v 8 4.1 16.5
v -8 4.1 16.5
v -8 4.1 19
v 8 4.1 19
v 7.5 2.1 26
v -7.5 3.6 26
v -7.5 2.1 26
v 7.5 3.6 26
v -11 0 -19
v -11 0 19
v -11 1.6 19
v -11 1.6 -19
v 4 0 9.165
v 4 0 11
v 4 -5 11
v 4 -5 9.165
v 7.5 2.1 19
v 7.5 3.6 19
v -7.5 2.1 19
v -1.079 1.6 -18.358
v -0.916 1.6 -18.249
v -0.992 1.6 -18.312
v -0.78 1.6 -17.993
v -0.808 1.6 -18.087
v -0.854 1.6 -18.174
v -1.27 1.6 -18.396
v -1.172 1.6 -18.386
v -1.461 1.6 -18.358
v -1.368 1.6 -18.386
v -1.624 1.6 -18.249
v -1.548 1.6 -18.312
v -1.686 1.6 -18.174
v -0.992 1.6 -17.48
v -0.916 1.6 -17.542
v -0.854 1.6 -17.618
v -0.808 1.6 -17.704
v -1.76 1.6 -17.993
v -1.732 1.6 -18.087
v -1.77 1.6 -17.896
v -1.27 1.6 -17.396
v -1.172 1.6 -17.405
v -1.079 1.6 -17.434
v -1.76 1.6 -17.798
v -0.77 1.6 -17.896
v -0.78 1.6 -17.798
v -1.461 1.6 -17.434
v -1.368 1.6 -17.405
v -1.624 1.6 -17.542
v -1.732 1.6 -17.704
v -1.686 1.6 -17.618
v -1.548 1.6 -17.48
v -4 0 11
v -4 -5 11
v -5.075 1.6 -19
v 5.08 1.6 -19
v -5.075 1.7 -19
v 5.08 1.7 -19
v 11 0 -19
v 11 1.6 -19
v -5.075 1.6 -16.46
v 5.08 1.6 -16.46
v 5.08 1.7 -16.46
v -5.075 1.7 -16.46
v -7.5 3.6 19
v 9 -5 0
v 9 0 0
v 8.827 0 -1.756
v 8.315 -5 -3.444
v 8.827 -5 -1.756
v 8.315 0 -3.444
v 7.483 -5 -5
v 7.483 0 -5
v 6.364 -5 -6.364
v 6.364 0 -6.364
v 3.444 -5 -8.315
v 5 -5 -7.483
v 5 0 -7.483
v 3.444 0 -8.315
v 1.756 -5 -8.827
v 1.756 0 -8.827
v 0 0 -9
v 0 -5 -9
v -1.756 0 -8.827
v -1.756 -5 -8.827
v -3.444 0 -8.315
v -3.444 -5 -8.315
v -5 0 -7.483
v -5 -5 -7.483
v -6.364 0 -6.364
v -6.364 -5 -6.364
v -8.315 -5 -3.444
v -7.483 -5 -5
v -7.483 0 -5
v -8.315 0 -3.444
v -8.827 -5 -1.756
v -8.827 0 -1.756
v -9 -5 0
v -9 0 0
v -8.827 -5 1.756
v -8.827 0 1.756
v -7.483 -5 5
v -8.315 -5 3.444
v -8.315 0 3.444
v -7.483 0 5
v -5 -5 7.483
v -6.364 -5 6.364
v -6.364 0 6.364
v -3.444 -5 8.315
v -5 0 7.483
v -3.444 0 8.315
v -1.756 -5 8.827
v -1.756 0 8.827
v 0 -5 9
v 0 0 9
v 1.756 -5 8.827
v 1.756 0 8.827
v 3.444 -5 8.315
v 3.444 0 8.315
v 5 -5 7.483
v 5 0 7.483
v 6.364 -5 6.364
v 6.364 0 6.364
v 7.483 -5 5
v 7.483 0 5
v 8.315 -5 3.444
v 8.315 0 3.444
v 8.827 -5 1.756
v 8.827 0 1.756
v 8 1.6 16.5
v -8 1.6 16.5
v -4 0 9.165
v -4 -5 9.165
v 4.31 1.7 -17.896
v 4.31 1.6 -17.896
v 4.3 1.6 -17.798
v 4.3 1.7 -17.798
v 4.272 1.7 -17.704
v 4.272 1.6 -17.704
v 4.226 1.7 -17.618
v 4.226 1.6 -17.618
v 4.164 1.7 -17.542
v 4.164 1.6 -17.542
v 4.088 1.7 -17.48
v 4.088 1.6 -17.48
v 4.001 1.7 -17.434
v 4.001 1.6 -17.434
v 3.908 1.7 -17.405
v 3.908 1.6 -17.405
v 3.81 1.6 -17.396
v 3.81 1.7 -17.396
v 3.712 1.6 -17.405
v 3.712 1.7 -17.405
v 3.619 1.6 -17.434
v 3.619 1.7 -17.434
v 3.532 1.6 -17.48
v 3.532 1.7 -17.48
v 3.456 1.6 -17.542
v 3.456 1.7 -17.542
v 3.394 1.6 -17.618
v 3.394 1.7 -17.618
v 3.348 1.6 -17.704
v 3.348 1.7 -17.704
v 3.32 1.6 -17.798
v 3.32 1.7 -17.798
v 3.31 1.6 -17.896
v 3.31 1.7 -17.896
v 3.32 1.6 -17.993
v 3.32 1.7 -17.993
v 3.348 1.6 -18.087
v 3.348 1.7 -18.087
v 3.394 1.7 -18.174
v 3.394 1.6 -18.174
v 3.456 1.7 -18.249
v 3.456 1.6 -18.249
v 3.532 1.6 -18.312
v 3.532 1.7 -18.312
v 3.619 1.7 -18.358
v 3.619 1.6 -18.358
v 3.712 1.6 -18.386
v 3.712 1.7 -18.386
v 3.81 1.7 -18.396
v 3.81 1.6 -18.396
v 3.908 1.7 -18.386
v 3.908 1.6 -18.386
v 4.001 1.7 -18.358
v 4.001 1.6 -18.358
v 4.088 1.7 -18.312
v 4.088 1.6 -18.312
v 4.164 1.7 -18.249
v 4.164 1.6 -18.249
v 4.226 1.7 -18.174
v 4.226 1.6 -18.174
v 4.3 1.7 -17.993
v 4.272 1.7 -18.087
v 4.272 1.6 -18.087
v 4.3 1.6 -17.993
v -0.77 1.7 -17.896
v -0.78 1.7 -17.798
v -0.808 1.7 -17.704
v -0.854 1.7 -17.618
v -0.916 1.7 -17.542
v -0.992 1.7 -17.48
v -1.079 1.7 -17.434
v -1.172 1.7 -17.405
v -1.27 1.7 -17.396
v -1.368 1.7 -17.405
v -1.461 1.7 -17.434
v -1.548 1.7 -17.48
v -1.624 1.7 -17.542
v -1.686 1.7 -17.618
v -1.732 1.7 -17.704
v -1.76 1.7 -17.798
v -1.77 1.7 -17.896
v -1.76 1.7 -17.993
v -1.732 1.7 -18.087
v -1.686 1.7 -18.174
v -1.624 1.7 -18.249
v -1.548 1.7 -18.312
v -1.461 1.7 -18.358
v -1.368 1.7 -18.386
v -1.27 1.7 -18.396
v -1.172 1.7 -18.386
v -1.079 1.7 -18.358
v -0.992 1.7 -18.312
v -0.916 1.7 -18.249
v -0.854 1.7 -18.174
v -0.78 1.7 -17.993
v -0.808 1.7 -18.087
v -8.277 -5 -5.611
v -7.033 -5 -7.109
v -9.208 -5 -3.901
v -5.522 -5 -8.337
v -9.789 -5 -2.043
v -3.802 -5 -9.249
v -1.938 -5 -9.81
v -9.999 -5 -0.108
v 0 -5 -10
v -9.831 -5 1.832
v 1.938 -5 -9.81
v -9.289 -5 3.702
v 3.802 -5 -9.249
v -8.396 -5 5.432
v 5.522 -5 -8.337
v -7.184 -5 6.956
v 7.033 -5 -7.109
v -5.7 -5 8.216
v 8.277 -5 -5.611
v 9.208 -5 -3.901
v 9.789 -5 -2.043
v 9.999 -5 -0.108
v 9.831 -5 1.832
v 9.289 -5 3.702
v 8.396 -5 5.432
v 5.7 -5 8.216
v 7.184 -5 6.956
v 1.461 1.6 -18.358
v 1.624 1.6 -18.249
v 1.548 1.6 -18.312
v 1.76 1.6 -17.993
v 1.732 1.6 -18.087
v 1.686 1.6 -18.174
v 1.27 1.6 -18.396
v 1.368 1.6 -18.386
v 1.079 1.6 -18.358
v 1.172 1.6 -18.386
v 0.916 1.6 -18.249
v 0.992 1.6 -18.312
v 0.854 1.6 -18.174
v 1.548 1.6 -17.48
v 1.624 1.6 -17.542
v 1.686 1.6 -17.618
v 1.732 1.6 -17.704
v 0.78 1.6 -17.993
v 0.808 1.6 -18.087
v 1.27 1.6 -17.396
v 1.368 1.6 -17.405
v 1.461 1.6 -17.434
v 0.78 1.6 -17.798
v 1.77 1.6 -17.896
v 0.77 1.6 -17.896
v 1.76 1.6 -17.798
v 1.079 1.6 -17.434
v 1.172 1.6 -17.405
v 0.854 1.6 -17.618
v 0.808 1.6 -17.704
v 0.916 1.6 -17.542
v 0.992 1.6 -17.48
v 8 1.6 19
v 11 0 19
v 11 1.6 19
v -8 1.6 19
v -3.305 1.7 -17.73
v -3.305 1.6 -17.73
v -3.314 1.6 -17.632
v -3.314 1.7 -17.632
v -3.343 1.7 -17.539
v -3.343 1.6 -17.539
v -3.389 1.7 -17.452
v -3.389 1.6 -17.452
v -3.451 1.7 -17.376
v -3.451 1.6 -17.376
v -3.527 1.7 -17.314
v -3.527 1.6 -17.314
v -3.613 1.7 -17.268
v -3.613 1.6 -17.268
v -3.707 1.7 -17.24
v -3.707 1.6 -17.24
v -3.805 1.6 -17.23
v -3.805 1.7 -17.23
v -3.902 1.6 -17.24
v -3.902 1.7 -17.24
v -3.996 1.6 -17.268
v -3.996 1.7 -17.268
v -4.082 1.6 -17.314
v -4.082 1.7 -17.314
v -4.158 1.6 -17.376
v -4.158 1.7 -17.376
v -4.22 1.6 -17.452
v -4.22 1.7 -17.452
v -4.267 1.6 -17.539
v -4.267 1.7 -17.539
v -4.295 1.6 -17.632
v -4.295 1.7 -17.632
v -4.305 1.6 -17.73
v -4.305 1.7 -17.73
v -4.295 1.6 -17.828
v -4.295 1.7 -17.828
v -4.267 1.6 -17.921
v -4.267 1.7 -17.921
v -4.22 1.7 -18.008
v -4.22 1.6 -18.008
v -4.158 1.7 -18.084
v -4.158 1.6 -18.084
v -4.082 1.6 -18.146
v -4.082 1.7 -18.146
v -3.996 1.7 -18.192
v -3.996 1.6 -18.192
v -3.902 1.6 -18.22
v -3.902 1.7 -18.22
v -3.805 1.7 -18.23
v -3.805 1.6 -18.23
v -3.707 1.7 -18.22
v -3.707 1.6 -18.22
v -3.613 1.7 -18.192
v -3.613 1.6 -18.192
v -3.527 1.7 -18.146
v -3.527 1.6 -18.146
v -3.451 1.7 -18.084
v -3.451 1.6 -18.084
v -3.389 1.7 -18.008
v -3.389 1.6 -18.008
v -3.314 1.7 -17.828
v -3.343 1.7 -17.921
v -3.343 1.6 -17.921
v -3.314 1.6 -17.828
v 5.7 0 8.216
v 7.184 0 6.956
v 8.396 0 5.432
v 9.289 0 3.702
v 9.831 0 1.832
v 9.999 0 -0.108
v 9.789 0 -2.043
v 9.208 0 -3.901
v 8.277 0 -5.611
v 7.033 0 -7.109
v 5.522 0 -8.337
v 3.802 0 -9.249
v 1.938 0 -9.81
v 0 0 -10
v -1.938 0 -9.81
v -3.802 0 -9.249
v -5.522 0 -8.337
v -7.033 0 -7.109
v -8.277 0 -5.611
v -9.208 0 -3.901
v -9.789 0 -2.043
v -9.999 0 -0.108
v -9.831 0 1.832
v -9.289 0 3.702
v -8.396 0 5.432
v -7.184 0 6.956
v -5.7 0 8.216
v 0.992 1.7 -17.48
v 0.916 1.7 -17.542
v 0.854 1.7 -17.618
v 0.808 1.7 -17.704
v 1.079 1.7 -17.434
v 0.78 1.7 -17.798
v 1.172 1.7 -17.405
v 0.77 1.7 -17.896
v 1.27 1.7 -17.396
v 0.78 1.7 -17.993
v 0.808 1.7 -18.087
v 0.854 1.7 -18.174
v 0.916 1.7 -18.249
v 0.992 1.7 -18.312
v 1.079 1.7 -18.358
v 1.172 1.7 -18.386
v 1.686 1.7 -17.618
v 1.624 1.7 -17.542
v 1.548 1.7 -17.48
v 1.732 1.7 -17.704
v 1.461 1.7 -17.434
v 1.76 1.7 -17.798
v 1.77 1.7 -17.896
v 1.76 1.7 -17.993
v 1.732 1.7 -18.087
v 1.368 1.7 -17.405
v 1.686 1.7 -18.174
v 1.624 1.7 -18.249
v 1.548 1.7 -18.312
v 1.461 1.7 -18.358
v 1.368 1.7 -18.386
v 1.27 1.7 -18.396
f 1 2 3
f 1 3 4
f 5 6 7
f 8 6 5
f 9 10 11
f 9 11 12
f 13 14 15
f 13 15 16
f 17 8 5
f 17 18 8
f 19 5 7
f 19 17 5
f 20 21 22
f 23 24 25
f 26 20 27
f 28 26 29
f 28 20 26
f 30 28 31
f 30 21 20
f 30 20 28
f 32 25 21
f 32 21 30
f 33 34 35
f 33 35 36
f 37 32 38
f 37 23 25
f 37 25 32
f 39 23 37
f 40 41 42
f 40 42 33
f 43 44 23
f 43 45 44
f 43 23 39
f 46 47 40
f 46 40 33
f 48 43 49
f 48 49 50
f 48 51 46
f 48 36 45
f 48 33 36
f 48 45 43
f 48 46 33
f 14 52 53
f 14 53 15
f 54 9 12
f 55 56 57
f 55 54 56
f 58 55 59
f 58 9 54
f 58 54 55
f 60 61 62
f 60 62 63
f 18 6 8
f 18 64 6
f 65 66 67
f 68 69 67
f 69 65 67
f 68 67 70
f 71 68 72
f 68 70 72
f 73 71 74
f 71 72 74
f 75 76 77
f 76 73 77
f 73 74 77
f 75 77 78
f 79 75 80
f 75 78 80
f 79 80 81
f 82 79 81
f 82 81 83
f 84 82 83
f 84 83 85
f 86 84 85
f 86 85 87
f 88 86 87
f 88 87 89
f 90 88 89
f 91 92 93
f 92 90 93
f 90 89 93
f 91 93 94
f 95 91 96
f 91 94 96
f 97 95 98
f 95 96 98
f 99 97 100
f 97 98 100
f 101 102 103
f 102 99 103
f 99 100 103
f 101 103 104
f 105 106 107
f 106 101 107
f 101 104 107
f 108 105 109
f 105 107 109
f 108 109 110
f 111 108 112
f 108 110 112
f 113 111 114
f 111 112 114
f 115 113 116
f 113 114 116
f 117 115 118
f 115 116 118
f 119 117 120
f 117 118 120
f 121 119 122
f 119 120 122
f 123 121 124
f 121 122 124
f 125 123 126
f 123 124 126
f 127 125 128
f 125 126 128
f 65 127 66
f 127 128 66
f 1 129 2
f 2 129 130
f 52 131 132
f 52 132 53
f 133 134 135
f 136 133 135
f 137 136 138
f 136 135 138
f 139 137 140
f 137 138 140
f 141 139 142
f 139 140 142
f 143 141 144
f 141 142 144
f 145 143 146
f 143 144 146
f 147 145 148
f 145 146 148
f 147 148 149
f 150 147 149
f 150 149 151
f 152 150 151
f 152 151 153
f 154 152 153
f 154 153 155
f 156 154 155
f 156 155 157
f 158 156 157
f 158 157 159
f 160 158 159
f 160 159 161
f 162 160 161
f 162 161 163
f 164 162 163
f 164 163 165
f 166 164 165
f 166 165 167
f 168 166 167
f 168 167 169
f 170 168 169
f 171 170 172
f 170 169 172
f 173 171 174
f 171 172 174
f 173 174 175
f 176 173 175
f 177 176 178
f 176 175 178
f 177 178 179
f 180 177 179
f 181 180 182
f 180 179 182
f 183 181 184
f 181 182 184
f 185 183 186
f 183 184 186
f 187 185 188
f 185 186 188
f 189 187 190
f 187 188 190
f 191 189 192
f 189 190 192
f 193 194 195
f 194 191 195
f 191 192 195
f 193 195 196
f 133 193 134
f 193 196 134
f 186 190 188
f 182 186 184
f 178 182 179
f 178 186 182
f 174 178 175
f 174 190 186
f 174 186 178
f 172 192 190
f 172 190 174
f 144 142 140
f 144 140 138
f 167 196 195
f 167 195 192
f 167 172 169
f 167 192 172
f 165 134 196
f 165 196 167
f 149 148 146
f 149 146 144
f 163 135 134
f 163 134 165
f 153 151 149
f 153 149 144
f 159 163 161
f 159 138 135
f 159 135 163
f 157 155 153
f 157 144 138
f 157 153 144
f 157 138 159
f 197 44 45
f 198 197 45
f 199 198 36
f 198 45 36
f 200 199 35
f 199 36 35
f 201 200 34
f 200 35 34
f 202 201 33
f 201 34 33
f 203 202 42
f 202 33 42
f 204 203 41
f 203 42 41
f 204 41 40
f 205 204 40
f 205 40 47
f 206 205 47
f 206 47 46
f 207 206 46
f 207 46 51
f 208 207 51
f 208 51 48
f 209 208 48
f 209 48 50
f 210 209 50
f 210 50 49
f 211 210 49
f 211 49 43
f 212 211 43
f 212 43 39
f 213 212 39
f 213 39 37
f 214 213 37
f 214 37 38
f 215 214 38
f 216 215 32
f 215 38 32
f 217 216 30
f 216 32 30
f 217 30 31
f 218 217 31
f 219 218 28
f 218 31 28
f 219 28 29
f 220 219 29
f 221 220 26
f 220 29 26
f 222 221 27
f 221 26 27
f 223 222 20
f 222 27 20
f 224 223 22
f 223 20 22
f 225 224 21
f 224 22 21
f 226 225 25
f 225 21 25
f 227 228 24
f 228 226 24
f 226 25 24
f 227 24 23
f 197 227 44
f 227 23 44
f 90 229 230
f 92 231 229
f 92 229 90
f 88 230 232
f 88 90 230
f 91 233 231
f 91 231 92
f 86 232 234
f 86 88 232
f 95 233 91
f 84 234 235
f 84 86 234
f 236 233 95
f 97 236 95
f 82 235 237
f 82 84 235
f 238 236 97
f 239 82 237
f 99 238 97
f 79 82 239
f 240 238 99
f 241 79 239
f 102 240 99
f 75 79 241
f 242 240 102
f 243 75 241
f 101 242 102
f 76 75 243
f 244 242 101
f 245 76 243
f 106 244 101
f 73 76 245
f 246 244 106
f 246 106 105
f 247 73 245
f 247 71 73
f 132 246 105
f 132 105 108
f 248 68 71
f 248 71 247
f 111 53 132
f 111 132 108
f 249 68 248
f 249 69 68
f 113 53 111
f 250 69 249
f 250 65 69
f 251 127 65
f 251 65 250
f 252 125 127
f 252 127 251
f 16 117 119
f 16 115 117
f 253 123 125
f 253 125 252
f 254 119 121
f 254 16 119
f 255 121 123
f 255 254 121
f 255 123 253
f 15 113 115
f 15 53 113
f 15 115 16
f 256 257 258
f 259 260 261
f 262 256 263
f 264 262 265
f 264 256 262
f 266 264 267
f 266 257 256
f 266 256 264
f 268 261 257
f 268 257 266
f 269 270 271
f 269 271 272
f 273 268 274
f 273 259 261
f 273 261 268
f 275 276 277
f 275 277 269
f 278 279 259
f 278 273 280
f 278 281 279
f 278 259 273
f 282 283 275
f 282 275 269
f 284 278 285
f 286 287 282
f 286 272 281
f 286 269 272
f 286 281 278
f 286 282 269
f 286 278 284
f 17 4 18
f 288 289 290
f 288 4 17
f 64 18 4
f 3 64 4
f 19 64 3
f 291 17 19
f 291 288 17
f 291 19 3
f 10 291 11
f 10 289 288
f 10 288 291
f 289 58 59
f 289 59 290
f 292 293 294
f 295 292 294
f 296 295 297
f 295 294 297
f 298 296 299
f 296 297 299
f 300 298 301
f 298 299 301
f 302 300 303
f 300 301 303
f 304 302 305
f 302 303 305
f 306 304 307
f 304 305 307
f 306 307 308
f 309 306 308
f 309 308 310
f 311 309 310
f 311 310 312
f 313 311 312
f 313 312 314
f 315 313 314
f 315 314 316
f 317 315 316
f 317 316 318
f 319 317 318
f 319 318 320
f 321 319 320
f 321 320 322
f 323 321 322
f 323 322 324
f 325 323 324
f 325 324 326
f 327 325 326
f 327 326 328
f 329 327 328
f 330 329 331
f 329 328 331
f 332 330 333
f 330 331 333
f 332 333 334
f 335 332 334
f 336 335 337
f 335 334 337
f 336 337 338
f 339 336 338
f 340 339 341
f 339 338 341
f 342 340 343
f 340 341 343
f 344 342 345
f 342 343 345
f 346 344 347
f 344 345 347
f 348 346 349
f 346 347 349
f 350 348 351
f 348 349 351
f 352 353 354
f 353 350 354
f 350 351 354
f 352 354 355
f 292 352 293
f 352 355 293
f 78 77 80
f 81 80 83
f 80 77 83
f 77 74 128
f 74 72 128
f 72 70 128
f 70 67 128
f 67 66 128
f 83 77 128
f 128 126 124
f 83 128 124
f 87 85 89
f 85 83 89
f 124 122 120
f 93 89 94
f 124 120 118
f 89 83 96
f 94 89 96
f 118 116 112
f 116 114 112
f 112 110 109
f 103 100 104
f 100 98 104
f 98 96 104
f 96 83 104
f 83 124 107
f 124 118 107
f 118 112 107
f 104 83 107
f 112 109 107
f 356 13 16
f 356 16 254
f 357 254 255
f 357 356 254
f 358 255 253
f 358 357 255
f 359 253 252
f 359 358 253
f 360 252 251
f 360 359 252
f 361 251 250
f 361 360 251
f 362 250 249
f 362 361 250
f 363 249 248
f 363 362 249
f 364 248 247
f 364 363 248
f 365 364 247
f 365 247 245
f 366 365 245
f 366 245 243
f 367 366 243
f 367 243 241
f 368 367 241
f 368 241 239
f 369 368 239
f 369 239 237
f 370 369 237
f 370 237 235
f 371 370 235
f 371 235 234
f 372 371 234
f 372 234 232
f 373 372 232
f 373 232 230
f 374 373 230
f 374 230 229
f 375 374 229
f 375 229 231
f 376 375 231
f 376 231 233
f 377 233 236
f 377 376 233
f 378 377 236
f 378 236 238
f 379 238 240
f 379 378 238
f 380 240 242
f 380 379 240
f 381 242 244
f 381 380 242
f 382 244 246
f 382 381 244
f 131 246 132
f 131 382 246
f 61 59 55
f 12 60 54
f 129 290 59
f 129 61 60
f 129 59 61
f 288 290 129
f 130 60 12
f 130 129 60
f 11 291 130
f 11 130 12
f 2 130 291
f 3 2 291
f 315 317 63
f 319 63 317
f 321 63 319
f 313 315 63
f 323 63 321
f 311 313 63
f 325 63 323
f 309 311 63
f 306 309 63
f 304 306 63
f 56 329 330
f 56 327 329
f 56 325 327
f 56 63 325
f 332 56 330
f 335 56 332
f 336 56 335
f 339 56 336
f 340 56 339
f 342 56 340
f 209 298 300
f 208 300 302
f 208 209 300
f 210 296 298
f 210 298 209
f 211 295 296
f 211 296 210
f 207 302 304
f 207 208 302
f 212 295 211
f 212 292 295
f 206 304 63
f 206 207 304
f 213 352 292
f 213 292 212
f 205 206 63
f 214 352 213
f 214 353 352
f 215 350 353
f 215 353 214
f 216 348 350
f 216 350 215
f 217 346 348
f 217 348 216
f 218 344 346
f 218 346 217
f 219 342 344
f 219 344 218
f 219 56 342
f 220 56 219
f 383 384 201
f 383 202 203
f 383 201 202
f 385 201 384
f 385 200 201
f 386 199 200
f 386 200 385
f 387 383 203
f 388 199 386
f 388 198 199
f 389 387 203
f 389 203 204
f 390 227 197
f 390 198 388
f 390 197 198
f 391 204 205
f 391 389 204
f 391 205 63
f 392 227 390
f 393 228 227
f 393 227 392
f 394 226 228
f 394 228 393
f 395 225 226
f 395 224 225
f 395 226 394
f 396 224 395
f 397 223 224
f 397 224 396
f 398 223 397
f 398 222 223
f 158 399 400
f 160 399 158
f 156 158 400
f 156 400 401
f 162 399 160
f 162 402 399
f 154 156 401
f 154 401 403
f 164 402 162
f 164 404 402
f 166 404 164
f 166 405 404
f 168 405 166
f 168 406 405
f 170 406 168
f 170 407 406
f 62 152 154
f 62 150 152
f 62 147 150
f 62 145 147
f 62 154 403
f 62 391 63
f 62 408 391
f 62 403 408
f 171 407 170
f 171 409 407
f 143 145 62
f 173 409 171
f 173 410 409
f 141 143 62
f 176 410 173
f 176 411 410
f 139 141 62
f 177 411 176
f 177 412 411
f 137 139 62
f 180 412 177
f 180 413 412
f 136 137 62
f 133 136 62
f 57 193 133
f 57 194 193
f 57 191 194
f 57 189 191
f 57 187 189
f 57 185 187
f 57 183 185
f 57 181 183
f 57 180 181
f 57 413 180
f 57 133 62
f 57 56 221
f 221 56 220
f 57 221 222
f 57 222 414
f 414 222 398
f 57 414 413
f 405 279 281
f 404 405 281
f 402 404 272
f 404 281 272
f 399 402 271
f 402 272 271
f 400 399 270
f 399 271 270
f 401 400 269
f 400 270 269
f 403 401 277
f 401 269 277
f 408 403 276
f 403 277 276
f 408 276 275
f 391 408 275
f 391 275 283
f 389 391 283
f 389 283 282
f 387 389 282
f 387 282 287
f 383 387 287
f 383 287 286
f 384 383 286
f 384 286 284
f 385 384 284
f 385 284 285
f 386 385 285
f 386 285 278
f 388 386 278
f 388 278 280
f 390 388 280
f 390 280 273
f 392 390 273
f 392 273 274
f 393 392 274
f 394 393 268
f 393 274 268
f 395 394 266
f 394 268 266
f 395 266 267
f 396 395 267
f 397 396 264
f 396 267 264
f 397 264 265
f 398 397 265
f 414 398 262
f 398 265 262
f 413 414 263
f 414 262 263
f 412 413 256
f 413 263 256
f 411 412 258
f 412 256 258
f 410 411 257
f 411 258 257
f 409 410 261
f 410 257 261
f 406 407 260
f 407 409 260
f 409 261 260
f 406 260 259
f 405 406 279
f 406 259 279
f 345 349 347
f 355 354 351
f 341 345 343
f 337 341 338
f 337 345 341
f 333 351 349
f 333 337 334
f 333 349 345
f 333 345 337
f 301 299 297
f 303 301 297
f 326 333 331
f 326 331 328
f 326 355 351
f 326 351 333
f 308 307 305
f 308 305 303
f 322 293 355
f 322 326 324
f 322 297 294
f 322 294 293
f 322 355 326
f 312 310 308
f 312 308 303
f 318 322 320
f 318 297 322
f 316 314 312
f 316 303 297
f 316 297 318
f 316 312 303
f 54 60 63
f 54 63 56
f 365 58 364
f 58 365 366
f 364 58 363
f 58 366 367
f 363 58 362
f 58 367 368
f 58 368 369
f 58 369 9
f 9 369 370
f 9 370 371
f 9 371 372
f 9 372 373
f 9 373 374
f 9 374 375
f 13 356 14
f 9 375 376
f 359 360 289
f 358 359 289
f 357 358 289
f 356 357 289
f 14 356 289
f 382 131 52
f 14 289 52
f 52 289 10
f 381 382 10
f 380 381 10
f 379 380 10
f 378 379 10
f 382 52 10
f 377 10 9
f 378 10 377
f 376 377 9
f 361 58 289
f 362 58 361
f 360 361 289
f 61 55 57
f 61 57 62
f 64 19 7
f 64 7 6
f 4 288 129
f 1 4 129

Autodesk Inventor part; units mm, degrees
ref_plane "YZ Plane" through (0, 0, 0) normal (1, 0, 0) x (0, 1, 0)
ref_plane "XZ Plane" through (0, 0, 0) normal (0, 1, 0) x (-1, 0, 0)
ref_plane "XY Plane" through (0, 0, 0) normal (0, 0, 1) x (1, 0, 0)
sketch "Sketch1" plane through (0, 0, 0) normal (0, 1, 0) x (-1, 0, 0)
  line L0 (11, -19) -> (-11, -19)
  line L1 (-11, -19) -> (-11, 19)
  line L2 (-11, 19) -> (11, 19)
  line L3 (11, 19) -> (11, -19)
  line L4 (11, -19) -> (-11, 19) construction
  line L5 (-11, -19) -> (11, 19) construction
  point P0 (0, 0)
  dimension "d0" = 22
  dimension "d1" = 38
extrude "Extrusion1" add sketch "Sketch1" along normal blind 1.6
sketch "Sketch2" plane through (0, 0, 0) normal (0, -1, 0) x (1, 0, 0)
  circle A0 centre (0, 0) radius 10
  circle A1 centre (0, 0) radius 9
  line L0 (-4, 9) -> (-4, 9)
  line L1 (-4, 9) -> (-4, 11)
  line L2 (-4, 11) -> (4, 11)
  line L3 (4, 11) -> (4, 9)
  point P0 (-4, 9.1652)
  point P1 (4, 9.1652)
  dimension "d4" = 20
  dimension "d7" = 18
  dimension "d8" = 8
  dimension "d9" = 2
  dimension "d10" = 0
extrude "Extrusion2" add sketch "Sketch2" along normal blind 5
sketch "Sketch3" plane through (0, 1.6, 0) normal (0, 1, 0) x (1, 0, 0)
  line L0 (-11, -19) -> (11, -19) projected
  line L1 (-8, -19) -> (8, -19)
  line L2 (8, -19) -> (8, -16.5)
  line L3 (8, -16.5) -> (-8, -16.5)
  line L4 (-8, -16.5) -> (-8, -19)
  line L5 (-11, 19) -> (-11, -19) projected
  line L6 (11, -19) -> (11, 19) projected
  point P0 (0, 0)
  dimension "d11" = 2.5
  dimension "d12" = 3
  dimension "d13" = 3
extrude "Extrusion3" add sketch "Sketch3" along normal blind 2.5
sketch "Sketch4" plane through (0, 1.6, 0) normal (0, 1, 0) x (1, 0, 0)
  line L0 (11, 19) -> (-11, 19) projected
  line L1 (-5.0746, 19) -> (5.08, 19)
  line L2 (5.08, 19) -> (5.08, 16.46)
  line L3 (5.08, 16.46) -> (-5.0746, 16.46)
  line L4 (-5.0746, 16.46) -> (-5.0746, 19)
  line L5 (-11, 19) -> (-11, -19) projected
  line L6 (11, -19) -> (11, 19) projected
  circle A0 centre (-3.8046, 17.73) radius 0.5
  circle A1 centre (-1.27, 17.8958) radius 0.5
  circle A2 centre (1.27, 17.8958) radius 0.5
  circle A3 centre (3.81, 17.8958) radius 0.5
  point P0 (0, 0)
  point P1 (0.0027, 19)
  point P2 (0, 19)
  dimension "d16" = 2.54
  dimension "d19" = 1
  dimension "d20" = 1
  dimension "d21" = 1
  dimension "d22" = 1
  dimension "d23" = 2.54
  dimension "d24" = 2.54
  dimension "d25" = 2.54
  dimension "d26" = 1.27
  dimension "d27" = 1.27
  dimension "d29" = 1.27
  dimension "d30" = 1.27
extrude "Extrusion4" add sketch "Sketch4" along normal blind 0.1
sketch "Sketch5" plane through (-11, 0, 19) normal (0, 0, 1) x (1, 0, 0)
  line L0 (3.5, 3.6) -> (18.5, 3.6)
  line L1 (18.5, 3.6) -> (18.5, 2.1)
  line L2 (18.5, 2.1) -> (3.5, 2.1)
  line L3 (3.5, 2.1) -> (3.5, 3.6)
  line L4 (3, 4.1) -> (19, 4.1) projected
  line L5 (3, 1.6) -> (3, 4.1) projected
  line L6 (19, 1.6) -> (19, 4.1) projected
  line L7 (0, 1.6) -> (3, 1.6) projected
  point P0 (11, 0)
  dimension "d35" = 0.5
  dimension "d36" = 0.5
  dimension "d37" = 0.5
  dimension "d38" = 0.5
extrude "Extrusion5" add sketch "Sketch5" along normal blind 7
equation "\"d13\" = d12"
properties part number "ZS042" material "PC/ABS Plastic"
